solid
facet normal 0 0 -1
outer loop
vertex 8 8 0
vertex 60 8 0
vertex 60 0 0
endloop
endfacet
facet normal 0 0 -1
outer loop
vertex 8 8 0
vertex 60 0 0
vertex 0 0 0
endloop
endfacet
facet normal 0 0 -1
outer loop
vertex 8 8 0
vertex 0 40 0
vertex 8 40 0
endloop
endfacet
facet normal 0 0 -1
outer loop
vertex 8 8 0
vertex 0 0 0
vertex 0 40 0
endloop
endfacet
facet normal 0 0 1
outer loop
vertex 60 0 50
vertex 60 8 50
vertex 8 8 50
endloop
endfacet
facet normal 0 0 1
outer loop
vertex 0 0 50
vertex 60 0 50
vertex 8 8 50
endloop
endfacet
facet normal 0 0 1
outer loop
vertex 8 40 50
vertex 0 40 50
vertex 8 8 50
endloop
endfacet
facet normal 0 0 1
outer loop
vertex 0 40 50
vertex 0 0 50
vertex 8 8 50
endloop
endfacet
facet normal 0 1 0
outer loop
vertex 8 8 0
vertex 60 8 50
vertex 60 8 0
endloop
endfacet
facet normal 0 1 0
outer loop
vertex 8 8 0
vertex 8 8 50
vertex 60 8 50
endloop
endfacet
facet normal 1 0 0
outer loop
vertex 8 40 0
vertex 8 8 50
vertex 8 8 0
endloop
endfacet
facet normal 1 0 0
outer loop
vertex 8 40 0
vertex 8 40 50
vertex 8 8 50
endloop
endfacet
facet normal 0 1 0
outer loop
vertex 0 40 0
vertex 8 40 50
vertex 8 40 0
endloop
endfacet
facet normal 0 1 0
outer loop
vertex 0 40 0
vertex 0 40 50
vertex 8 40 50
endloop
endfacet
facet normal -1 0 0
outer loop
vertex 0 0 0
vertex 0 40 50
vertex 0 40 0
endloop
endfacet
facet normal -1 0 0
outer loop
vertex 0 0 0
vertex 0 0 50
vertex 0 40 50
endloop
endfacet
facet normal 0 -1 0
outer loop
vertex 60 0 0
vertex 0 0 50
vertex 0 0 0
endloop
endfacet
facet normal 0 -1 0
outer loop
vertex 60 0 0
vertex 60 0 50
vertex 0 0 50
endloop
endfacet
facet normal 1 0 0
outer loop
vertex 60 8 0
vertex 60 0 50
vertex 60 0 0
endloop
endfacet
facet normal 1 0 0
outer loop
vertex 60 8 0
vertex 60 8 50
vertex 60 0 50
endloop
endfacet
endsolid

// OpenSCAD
$fn = 32;

// ----------------------------------------------------------------------
// Structural section: angle 60 x 40 mm
// ----------------------------------------------------------------------

// --- parameters (mm) ---
sec_w = 60;               // leg width, X
sec_h = 40;               // leg height, Y
flange_t = 8;             // leg thickness
plate_t = 50;             // cut length, Z (extrusion height)

profile = [[0, 0], [60, 0], [60, 8], [8, 8], [8, 40], [0, 40]];  // primary outline, 6 points, counter clockwise

// --- the one profile operation ---
linear_extrude(height = plate_t) polygon(points = profile);
